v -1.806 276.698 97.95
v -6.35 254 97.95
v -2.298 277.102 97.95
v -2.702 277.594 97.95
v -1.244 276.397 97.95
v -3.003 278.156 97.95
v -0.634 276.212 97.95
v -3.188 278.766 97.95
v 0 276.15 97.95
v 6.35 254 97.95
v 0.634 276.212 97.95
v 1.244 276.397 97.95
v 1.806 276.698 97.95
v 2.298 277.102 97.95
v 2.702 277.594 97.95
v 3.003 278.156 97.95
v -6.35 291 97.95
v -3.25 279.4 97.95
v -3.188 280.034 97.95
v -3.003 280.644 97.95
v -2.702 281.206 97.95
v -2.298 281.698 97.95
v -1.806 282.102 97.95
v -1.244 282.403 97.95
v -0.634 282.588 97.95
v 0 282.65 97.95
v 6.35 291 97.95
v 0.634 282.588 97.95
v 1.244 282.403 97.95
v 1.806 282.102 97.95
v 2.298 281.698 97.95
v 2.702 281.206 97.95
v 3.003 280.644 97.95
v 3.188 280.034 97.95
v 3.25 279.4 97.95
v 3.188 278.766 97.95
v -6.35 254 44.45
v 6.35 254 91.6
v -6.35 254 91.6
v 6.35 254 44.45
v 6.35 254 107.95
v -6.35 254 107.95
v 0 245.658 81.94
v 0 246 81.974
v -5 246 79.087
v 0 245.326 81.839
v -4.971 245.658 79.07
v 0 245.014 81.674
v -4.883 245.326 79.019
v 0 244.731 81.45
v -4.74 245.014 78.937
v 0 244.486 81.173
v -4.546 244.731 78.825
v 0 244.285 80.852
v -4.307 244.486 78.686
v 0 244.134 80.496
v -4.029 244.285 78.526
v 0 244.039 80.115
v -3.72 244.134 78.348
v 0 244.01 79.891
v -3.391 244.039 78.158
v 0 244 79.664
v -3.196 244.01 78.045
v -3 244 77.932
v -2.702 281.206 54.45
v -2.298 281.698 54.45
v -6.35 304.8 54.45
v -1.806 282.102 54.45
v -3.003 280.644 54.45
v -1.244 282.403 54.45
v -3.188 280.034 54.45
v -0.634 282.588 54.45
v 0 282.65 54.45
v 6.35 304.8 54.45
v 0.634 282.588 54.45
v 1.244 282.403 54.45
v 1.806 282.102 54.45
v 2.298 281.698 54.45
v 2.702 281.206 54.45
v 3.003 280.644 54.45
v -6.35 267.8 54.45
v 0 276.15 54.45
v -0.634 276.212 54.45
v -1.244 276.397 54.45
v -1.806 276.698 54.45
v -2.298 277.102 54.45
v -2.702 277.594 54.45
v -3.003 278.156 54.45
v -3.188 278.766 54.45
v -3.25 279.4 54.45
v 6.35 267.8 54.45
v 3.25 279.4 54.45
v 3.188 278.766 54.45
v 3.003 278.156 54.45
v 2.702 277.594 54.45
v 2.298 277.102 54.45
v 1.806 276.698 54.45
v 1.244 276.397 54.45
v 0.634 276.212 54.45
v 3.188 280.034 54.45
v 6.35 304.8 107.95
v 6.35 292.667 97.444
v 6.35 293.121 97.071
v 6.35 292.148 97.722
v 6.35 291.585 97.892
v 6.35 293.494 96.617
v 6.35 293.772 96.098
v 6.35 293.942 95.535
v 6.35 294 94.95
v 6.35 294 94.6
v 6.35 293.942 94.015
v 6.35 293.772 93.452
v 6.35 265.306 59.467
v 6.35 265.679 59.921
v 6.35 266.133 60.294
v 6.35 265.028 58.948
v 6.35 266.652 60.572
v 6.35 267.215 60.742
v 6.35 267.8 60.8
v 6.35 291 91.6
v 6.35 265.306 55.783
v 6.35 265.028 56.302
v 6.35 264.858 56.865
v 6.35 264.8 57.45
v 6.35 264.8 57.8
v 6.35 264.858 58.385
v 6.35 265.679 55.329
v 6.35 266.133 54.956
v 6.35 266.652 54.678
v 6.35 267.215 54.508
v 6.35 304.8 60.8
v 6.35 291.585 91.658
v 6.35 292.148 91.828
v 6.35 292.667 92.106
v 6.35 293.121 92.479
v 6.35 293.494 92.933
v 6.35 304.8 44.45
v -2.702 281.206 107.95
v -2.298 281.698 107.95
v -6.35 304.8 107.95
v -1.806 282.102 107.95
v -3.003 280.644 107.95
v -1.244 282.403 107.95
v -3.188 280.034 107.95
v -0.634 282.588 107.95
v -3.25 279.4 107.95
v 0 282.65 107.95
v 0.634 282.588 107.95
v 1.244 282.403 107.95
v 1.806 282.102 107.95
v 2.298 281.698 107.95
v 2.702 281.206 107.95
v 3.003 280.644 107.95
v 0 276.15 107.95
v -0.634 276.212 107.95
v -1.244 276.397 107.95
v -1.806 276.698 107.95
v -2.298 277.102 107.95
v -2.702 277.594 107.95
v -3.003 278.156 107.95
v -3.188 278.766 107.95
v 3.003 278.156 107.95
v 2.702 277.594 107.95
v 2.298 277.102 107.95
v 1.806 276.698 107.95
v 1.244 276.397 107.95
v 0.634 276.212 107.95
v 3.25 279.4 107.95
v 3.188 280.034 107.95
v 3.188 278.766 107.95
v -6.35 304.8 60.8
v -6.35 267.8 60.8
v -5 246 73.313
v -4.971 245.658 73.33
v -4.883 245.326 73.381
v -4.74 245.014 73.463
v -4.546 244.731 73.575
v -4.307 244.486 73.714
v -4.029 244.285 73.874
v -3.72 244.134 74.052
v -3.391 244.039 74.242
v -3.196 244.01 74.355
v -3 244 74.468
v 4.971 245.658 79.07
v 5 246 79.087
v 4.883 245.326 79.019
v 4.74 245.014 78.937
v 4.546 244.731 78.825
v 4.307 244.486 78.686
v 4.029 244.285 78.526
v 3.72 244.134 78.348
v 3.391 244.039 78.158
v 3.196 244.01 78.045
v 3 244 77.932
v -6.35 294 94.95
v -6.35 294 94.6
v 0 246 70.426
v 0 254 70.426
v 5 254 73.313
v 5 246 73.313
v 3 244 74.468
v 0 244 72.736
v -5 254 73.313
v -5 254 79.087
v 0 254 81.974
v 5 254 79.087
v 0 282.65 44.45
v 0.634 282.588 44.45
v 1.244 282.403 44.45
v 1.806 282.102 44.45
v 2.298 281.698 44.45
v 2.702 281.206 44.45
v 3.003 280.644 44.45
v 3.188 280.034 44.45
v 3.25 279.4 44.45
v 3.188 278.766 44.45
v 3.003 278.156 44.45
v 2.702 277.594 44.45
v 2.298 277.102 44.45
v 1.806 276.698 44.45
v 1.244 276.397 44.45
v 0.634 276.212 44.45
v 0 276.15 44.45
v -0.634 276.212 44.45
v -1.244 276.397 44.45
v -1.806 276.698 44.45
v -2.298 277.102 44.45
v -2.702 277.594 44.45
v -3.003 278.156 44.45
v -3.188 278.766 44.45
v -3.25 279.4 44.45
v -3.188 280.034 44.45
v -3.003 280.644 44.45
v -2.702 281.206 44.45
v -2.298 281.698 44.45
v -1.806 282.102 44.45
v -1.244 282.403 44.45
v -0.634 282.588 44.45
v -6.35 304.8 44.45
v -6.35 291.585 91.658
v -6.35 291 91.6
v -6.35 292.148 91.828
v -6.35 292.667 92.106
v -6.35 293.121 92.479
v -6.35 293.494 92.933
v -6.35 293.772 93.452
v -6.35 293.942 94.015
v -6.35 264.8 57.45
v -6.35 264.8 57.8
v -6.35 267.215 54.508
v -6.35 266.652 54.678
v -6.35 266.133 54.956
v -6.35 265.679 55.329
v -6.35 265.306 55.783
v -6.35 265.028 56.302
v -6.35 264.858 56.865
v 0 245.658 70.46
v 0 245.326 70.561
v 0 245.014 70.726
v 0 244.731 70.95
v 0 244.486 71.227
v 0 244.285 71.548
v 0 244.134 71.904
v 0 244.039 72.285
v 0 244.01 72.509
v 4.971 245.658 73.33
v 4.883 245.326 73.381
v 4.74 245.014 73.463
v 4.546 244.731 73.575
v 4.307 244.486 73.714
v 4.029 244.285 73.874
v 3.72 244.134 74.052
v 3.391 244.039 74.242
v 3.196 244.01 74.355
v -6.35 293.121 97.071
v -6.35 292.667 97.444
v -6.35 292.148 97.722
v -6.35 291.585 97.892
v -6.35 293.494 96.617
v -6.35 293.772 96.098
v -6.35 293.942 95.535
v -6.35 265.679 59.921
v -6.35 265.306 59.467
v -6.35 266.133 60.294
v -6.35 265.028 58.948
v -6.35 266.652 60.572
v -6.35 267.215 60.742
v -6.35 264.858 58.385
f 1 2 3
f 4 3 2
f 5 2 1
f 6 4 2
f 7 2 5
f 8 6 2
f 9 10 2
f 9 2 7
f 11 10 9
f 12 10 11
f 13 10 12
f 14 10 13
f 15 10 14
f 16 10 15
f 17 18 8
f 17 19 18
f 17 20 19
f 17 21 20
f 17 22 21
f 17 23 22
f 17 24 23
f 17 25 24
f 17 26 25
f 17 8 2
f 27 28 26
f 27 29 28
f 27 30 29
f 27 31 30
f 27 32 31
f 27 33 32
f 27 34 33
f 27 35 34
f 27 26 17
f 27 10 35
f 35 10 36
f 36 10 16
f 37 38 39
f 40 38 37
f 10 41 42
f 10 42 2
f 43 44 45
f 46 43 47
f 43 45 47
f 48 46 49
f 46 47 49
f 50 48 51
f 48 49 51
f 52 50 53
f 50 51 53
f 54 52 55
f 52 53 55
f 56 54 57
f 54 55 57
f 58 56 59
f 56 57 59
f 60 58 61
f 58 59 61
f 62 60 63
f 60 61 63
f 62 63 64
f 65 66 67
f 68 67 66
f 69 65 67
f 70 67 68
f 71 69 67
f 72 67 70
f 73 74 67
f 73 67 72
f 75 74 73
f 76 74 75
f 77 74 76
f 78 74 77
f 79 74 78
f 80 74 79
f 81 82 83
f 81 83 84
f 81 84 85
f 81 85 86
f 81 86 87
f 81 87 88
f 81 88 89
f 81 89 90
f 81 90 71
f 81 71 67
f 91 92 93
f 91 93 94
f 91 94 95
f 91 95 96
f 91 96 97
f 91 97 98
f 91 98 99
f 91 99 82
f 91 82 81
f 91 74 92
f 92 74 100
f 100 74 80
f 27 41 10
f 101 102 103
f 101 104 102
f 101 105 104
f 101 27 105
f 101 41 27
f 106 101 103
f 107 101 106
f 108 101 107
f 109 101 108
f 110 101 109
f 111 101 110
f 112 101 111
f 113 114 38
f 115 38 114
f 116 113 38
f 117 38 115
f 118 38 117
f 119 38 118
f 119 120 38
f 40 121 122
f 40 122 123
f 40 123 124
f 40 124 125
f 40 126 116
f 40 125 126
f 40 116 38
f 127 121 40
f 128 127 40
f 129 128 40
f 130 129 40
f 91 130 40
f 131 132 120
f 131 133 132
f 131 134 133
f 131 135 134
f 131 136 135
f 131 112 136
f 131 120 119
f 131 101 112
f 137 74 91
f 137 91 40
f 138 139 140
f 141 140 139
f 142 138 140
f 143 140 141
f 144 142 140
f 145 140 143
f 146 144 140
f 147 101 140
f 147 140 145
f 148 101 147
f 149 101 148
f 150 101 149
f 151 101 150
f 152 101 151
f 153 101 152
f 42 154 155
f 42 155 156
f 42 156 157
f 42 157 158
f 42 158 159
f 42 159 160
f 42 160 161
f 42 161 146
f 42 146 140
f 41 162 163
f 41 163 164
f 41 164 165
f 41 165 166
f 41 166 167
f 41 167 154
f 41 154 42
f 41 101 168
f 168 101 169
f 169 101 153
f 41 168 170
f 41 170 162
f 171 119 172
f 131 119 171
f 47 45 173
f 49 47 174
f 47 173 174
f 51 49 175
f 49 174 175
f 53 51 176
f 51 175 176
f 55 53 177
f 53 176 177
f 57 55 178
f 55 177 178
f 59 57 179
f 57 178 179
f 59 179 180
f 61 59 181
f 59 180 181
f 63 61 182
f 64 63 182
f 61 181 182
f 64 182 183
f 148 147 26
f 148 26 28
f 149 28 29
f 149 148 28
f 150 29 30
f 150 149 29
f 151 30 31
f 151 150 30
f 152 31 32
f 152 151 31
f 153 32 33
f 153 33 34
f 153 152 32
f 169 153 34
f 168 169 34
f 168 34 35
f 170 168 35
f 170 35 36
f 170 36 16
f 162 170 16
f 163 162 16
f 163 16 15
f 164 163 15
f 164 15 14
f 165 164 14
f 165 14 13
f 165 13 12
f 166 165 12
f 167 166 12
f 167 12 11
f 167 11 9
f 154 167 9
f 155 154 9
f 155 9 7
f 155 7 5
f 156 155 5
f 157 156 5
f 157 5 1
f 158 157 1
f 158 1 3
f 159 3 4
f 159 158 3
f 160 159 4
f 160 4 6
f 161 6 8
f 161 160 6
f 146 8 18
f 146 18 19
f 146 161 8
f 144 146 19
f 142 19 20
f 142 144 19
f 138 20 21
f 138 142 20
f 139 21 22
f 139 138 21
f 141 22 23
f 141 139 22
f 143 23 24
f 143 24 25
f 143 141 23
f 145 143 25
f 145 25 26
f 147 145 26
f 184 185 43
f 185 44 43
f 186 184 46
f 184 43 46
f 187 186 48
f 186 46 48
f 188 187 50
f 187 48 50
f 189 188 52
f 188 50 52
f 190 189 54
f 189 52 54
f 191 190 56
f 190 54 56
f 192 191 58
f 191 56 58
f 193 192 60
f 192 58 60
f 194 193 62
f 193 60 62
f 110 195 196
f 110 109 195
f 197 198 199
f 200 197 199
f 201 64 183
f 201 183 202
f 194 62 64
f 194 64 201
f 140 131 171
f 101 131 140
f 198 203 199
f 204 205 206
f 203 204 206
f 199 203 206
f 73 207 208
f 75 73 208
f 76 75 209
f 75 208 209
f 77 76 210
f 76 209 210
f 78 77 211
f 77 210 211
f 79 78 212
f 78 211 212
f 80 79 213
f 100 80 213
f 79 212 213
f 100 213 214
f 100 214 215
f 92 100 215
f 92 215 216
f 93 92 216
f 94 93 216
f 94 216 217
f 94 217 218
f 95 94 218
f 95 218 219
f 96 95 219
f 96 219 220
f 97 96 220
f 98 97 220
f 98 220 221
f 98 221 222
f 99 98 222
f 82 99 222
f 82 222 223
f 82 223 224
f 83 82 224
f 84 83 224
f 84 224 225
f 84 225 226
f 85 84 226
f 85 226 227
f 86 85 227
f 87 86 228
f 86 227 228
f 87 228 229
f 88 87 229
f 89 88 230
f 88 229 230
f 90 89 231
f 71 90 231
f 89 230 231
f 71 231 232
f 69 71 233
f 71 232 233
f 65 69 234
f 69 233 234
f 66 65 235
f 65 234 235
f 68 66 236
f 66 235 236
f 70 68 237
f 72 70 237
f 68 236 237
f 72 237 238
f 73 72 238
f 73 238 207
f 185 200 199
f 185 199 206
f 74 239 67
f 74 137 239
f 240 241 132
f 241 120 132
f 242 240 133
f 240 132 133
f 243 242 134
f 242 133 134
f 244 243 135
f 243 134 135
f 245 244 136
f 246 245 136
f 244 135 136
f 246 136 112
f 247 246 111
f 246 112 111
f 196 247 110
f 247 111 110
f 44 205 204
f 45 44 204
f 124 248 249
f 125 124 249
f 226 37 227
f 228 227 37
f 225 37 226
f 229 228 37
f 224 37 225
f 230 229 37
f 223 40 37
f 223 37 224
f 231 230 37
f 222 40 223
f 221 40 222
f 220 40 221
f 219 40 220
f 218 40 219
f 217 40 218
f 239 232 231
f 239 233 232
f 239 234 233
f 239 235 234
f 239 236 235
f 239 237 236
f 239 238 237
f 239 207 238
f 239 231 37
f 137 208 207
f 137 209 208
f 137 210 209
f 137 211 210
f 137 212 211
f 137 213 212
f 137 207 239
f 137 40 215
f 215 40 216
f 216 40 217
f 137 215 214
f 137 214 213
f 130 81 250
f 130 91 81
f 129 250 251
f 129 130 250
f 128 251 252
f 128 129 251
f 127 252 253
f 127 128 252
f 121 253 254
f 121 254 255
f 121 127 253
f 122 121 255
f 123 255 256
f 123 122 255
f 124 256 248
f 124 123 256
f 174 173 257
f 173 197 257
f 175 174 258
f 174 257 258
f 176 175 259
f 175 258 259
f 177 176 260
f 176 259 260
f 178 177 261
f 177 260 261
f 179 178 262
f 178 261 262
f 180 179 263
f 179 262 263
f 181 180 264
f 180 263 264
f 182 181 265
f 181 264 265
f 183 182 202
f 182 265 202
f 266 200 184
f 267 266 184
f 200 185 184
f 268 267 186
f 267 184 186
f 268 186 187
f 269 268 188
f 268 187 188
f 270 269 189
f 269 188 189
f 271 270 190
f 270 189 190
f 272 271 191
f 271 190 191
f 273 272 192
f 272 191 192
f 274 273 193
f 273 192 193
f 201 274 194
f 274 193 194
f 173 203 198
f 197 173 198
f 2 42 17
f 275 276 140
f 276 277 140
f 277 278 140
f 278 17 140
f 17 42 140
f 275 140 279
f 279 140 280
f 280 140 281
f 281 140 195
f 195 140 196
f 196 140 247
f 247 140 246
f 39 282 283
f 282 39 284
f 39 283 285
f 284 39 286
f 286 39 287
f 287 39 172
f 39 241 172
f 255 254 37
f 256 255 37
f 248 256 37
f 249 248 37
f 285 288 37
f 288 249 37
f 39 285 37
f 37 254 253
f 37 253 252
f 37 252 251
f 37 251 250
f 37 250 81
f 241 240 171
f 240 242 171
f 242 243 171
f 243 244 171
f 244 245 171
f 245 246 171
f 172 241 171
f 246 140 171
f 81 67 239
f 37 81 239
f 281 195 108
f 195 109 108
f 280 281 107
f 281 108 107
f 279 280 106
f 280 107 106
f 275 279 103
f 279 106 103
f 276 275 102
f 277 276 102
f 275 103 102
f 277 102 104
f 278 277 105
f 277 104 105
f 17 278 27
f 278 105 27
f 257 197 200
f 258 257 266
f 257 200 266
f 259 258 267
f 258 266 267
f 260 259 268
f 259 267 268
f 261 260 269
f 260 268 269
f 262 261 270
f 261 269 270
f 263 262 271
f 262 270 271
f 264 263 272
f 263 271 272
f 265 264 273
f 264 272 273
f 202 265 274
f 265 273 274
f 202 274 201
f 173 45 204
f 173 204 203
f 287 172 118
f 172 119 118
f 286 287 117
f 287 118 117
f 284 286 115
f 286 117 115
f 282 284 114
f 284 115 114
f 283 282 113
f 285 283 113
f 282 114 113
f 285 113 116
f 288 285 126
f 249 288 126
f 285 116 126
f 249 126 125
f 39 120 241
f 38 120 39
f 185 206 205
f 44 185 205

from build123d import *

# Parameters (mm, degrees)
BOSS_EXTRUDE1_DEPTH = 6.35
FILLET1_R           = 3
CUT_EXTRUDE1_REACH  = 313.409
SKETCH2_R           = 3.25
BOSS_EXTRUDE2_DEPTH = 10
FILLET2_R           = 2


with BuildPart() as part:
    # Sketch1 → Boss-Extrude1 (new, symmetric)
    with BuildSketch(Plane(origin=(0, 0, 0), x_dir=(0, 0, -1), z_dir=(1, 0, 0))):
        Polygon((-54.45, 304.8), (-54.45, 264.8), (-60.8, 264.8), (-60.8, 304.8), (-107.95, 304.8), (-107.95, 254), (-97.95, 254), (-97.95, 294), (-91.6, 294), (-91.6, 254), (-44.45, 254), (-44.45, 304.8), align=None)
    extrude(amount=BOSS_EXTRUDE1_DEPTH, both=True)

    # Fillet1
    fillet1_edges = [part.edges().sort_by_distance(p)[0] for p in [
        (0, 264.8, 54.45),
        (0, 294, 91.6),
        (0, 294, 97.95),
        (0, 264.8, 60.8),
    ]]
    fillet(fillet1_edges, radius=FILLET1_R)

    # Sketch2 → Cut-Extrude1 (cut, up to next)
    with BuildSketch(Plane(origin=(0, 0, 44.45), x_dir=(-1, 0, 0), z_dir=(0, 0, -1)), mode=Mode.PRIVATE) as cut_extrude1_sk1:
        with Locations(Location((0, 279.4, 0), (0, 0, 90))):
            Circle(SKETCH2_R)
    cut_extrude1_tool1 = extrude(cut_extrude1_sk1.sketch, amount=-CUT_EXTRUDE1_REACH, mode=Mode.PRIVATE) & part.part
    cut_extrude1 = cut_extrude1_tool1.solids().sort_by_distance((0, 279.4, 44.45))[0]
    add(cut_extrude1, mode=Mode.SUBTRACT)

    # Mirror2: Cut-Extrude1 across plane
    add(cut_extrude1.mirror(Plane(origin=(0, 0, 76.2), x_dir=(1, 0, 0), z_dir=(0, 0, -1))), mode=Mode.SUBTRACT)


with BuildPart() as body_2:
    # Sketch8 → Boss-Extrude2 (new body)
    with BuildSketch(Plane.XZ.offset(-254)):
        Polygon((5, 73.313248654), (5, 79.086751346), (0, 81.973502692), (-5, 79.086751346), (-5, 73.313248654), (0, 70.426497308), align=None)
    extrude(amount=BOSS_EXTRUDE2_DEPTH)

    # Fillet2
    fillet2_edges = [body_2.edges().sort_by_distance(p)[0] for p in [
        (2.5, 244, 80.530127019),
        (-2.5, 244, 80.530127019),
        (-5, 244, 76.2),
        (-2.5, 244, 71.869872981),
        (2.5, 244, 71.869872981),
        (5, 244, 76.2),
    ]]
    fillet(fillet2_edges, radius=FILLET2_R)


solid = Compound([part.part, body_2.part])
